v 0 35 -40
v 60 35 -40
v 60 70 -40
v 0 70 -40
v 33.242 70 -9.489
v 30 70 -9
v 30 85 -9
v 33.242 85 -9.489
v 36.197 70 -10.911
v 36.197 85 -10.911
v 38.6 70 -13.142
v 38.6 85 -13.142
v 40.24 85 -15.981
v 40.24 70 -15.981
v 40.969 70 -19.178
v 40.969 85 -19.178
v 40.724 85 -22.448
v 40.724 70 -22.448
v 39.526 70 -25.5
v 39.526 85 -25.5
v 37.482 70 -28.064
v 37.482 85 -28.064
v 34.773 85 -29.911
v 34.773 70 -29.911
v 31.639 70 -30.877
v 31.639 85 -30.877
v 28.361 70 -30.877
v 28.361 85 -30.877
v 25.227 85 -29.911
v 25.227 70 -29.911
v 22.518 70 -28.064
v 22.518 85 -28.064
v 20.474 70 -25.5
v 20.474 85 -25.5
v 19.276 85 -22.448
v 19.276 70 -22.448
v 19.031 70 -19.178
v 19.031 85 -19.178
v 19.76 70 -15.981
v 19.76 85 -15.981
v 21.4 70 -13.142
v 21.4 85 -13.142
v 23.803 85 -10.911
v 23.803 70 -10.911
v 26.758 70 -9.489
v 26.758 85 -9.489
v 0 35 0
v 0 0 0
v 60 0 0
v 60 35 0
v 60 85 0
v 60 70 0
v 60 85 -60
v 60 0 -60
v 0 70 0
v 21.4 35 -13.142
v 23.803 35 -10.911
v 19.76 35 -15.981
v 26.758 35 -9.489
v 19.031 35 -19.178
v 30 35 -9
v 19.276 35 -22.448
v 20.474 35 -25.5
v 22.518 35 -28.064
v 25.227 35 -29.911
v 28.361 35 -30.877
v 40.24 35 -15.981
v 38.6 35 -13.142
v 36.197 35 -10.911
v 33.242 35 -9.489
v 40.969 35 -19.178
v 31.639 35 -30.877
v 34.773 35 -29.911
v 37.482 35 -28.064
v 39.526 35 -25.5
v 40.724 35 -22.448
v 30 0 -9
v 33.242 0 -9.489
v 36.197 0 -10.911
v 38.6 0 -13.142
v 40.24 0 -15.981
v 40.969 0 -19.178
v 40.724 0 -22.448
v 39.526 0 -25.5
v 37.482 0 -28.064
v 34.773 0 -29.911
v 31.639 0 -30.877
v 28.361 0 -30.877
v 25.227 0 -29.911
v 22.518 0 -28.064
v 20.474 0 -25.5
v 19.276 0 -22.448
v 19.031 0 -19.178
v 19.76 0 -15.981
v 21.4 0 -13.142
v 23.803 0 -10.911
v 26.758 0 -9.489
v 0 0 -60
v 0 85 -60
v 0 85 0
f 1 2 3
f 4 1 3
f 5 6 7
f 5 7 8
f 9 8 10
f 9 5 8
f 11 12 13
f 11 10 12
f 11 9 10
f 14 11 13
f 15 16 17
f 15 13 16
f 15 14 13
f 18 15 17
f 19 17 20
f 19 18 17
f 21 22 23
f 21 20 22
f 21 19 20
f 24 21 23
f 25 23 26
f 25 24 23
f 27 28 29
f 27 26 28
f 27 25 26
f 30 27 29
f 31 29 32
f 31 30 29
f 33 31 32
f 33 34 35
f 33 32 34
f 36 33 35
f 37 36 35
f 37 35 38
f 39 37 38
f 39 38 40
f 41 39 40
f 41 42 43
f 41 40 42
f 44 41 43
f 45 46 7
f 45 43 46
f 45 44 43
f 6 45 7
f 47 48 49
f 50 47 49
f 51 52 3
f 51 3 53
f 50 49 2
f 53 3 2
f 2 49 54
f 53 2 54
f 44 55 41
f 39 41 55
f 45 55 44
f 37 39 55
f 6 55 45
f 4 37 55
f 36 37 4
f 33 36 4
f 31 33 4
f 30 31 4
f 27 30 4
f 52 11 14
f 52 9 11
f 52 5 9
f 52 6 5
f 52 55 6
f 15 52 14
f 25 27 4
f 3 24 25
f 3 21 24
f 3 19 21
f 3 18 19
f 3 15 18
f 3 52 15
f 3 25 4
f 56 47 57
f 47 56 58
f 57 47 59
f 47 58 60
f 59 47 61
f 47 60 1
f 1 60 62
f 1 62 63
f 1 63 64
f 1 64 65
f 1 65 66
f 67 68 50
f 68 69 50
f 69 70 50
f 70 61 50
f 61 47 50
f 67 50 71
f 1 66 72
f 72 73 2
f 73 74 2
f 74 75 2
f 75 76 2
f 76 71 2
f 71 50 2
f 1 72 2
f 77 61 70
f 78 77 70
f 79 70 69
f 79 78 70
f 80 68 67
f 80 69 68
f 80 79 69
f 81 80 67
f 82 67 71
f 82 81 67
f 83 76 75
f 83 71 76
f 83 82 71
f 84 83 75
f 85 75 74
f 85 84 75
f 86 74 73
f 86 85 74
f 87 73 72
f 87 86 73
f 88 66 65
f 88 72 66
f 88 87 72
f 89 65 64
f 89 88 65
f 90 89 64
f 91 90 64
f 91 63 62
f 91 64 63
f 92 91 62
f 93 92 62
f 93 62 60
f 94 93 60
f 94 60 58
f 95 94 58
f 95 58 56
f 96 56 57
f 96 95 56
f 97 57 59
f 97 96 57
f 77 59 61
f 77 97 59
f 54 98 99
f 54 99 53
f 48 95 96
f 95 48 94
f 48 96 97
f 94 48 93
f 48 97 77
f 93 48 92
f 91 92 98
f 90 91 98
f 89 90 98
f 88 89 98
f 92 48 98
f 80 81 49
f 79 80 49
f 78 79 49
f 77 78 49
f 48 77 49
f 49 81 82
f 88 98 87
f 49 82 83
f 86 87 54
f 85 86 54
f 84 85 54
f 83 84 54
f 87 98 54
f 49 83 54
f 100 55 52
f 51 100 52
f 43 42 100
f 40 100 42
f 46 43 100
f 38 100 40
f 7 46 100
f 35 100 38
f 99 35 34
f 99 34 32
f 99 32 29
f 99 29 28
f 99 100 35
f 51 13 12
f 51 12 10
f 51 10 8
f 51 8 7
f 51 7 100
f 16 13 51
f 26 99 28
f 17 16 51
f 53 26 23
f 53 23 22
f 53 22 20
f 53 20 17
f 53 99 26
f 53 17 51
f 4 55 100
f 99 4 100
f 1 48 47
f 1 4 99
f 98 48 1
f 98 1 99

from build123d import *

# Parameters (mm, degrees)
SKETCH1_W               = 60
SKETCH1_H               = 60
BOSS_EXTRUDE1_DEPTH     = 85
SKETCH2_W               = 40
SKETCH2_H               = 35
CUT_EXTRUDE1_DEPTH      = 121.104121495
CUT_EXTRUDE2_DEPTH      = 99.488578018
CUT_EXTRUDE2_DEPTH_BACK = 99.488578018
SKETCH3_R               = 11


with BuildPart() as part:
    # Sketch1 → Boss-Extrude1 (new body)
    with BuildSketch(Plane(origin=(0, 0, 0), x_dir=(1, 0, 0), z_dir=(0, 1, 0))):
        with Locations((30, 30)):
            Rectangle(SKETCH1_W, SKETCH1_H)
    extrude(amount=BOSS_EXTRUDE1_DEPTH)

    # Sketch2 → Cut-Extrude1 (cut, through all)
    with BuildSketch(Plane(origin=(60, 0, 0), x_dir=(0, 0, -1), z_dir=(1, 0, 0))):
        with Locations((20, 52.5)):
            Rectangle(SKETCH2_W, SKETCH2_H)
    extrude(amount=-CUT_EXTRUDE1_DEPTH, mode=Mode.SUBTRACT)

    # Sketch3 → Cut-Extrude2 (cut, two sides: drawn at the far end of the back side and taken through both)
    with BuildSketch(Plane(origin=(0, 35, 0), x_dir=(1, 0, 0), z_dir=(0, 1, 0)).offset(-CUT_EXTRUDE2_DEPTH_BACK)):
        with Locations(Location((30, 20, 0), (0, 0, 270))):
            Circle(SKETCH3_R)
    extrude(amount=CUT_EXTRUDE2_DEPTH + CUT_EXTRUDE2_DEPTH_BACK, mode=Mode.SUBTRACT)


solid = part.part
